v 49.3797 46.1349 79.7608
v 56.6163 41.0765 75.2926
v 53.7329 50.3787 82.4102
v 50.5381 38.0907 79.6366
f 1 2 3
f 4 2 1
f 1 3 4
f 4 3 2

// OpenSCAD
// Auto-generated auxetic polyhedron
points = [
    [53.732889, 50.378664, 82.410176],
    [56.616282, 41.076458, 75.292608],
    [49.379717, 46.134878, 79.760830],
    [50.538061, 38.090656, 79.636595],
];

faces = [
    [0, 1, 2],
    [2, 1, 3],
    [3, 0, 2],
    [1, 0, 3],
];

polyhedron(points = points, faces = faces);
